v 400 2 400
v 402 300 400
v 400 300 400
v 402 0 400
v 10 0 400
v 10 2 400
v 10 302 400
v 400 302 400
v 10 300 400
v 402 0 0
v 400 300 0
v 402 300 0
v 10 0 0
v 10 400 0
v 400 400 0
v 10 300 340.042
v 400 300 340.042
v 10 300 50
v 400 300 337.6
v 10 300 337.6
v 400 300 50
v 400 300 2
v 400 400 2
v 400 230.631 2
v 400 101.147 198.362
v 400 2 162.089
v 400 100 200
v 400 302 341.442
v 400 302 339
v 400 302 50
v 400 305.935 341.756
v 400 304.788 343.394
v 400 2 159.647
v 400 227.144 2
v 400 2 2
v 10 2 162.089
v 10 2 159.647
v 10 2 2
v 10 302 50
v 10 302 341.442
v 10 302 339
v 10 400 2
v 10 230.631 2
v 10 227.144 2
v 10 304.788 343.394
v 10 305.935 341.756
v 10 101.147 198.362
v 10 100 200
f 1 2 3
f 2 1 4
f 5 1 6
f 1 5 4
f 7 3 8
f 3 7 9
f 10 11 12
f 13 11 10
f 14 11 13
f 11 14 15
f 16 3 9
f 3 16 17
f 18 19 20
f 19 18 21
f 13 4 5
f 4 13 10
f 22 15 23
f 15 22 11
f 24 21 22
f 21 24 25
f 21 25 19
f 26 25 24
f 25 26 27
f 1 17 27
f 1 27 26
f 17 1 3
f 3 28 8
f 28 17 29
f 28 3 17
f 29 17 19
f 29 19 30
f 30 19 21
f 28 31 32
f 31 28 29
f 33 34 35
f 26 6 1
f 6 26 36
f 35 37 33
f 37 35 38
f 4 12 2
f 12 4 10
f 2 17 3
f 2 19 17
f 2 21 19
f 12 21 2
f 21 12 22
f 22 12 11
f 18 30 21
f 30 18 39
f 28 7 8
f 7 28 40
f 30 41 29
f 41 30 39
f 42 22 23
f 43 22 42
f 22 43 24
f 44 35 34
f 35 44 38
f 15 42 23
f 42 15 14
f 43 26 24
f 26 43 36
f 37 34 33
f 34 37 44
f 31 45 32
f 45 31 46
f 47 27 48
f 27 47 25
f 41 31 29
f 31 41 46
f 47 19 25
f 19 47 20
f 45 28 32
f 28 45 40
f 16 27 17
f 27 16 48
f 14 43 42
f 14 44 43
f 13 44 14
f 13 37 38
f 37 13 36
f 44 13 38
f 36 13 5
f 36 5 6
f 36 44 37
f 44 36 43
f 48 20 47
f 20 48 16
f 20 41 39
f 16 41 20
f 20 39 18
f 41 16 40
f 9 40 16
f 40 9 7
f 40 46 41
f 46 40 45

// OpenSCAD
difference(){
union(){
translate([0,0,0])cube([2, 300, 400]);
translate([0,0,0])cube([400, 2, 400]);
translate([400,0, 0])cube([2, 300, 400]);
translate([0,300,50])cube([400, 2, 350]);
translate([0,0,0])cube([400, 400, 2]);
translate([0,230,])rotate([55, 0,0])cube([400, 2, 280]);
translate([0,100,200])rotate([-55, 0,0])cube([400, 2, 250]);
}

translate([-10, 0, -5])
cube([20, 500, 500]);
}
